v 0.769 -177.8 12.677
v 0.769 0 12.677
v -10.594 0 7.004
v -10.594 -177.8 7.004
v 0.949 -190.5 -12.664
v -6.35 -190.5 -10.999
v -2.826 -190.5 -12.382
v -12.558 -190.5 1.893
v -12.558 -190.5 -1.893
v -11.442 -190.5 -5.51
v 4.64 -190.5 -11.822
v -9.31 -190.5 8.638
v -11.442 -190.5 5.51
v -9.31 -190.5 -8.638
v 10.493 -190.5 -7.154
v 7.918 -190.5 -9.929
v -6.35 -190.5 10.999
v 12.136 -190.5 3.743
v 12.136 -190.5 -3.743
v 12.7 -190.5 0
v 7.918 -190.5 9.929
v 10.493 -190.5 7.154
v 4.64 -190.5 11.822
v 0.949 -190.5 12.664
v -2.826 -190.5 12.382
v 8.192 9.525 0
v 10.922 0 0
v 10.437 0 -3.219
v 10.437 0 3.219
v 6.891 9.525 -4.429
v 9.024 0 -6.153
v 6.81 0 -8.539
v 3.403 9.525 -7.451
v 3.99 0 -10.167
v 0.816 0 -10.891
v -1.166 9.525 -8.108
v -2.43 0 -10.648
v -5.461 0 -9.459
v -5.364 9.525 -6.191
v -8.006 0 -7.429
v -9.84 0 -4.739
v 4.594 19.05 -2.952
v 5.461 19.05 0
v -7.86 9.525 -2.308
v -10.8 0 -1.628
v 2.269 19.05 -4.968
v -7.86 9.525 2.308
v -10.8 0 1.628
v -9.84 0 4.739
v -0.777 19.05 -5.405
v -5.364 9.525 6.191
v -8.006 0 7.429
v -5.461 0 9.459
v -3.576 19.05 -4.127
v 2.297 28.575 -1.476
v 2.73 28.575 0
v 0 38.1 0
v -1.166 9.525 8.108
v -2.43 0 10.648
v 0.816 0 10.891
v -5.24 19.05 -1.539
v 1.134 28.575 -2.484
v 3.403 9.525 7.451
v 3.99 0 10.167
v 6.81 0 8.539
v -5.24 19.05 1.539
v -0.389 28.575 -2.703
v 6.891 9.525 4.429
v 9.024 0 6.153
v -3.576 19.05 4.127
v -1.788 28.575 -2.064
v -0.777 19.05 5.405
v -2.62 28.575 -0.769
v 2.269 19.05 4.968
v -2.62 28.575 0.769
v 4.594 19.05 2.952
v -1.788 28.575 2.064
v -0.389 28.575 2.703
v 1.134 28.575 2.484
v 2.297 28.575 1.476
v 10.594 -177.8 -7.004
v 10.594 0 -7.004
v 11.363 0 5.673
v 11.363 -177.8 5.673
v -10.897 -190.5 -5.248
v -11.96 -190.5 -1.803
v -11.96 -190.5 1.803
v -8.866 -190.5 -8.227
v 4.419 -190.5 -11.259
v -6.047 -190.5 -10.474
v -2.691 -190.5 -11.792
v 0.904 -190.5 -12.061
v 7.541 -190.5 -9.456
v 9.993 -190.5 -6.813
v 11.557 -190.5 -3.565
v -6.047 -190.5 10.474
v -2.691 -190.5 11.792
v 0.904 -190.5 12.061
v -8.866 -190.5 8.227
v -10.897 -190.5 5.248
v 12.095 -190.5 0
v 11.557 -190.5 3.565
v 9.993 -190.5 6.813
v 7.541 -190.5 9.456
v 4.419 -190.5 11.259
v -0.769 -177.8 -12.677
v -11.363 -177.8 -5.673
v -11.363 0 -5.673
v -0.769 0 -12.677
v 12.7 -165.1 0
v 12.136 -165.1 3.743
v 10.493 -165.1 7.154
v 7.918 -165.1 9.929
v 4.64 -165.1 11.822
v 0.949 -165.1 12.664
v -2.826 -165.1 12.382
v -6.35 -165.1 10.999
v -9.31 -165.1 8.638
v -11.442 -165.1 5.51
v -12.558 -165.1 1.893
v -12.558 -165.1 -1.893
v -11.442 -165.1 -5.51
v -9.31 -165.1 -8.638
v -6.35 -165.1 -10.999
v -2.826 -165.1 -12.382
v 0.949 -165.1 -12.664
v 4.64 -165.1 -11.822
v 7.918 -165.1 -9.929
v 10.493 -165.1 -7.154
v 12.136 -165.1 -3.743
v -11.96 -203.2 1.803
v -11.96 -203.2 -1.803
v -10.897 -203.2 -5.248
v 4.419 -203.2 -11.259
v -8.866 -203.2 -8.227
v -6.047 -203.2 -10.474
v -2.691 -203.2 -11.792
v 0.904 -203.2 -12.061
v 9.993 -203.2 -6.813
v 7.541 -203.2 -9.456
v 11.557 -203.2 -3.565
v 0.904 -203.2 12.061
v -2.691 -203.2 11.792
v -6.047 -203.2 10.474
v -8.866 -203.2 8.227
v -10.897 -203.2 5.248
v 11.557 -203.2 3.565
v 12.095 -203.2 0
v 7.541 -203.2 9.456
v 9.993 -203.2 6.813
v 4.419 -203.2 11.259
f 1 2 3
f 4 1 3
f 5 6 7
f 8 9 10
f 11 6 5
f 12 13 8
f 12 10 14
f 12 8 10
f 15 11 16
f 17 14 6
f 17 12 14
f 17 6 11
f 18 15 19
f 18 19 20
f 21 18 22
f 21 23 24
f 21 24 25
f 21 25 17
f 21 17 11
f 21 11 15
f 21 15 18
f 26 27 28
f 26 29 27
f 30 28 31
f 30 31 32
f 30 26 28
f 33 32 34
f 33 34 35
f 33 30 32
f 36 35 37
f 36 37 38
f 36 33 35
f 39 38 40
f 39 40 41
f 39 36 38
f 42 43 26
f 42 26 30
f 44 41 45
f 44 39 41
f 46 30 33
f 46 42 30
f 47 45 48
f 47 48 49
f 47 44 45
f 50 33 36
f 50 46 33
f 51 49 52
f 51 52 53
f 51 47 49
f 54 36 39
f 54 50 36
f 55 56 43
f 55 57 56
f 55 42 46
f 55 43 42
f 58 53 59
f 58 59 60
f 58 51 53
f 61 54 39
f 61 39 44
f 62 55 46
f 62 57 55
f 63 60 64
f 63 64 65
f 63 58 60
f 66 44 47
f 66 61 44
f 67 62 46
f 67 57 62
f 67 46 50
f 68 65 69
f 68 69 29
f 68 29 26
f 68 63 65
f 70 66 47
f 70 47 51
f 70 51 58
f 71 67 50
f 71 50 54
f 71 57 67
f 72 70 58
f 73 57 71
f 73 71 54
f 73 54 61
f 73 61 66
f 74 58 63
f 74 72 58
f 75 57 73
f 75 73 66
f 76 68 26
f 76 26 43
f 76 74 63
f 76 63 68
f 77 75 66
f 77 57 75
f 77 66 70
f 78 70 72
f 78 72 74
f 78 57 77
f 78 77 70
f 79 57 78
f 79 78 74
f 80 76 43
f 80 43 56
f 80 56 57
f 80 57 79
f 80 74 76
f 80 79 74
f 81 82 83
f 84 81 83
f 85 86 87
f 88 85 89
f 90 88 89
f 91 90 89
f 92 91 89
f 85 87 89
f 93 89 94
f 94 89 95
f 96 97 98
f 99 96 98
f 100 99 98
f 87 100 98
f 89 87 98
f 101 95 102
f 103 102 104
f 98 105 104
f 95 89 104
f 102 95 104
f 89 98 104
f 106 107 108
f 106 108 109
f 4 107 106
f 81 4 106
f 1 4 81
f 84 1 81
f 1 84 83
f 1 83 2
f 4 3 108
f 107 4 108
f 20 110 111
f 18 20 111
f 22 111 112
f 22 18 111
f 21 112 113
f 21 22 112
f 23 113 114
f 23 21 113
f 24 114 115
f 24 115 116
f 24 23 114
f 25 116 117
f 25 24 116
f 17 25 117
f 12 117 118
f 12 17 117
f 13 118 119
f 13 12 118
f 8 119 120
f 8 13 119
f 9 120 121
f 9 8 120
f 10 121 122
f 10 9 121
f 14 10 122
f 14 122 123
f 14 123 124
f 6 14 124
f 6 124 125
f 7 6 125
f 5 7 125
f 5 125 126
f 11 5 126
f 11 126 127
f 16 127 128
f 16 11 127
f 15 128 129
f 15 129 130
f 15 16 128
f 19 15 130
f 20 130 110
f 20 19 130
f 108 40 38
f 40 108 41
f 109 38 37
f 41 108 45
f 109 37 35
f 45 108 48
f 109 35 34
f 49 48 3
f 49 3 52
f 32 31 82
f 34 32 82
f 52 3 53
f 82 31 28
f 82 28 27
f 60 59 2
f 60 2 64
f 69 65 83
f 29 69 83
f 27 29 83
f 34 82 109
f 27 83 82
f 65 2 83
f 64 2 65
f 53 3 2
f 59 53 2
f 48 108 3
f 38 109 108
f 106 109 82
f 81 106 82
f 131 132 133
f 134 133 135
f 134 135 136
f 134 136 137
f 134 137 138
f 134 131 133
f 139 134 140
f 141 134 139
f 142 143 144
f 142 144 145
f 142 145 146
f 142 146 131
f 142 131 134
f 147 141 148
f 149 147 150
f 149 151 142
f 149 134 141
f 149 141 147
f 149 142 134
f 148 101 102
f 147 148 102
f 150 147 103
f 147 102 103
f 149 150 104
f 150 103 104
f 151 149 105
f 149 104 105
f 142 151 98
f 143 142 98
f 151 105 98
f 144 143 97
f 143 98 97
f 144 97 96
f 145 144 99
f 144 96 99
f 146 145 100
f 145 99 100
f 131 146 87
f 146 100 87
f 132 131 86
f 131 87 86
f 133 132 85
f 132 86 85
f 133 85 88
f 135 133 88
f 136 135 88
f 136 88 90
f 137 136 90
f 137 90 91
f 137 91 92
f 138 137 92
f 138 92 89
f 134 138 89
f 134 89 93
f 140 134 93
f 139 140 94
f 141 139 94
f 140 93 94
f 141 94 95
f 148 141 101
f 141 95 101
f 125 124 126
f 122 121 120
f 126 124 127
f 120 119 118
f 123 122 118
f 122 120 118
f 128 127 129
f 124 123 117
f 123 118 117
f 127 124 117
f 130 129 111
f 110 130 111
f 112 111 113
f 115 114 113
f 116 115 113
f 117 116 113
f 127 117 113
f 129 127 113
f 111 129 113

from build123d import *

# Parameters (mm, degrees)
F1_DEPTH = 177.8
F4_R     = 12.7
F5_DEPTH = 12.7
F6_R     = 12.09476
F7_DEPTH = 12.7


with BuildPart() as f1:
    # F0 (on Front) → F1 (new body)
    with BuildSketch(Plane.XZ):
        Polygon((-0.768505, -12.676727), (10.594115, -7.003908), (11.36262, 5.672819), (0.768505, 12.676727), (-10.594115, 7.003908), (-11.36262, -5.672819), align=None)
    extrude(amount=F1_DEPTH)

    # F2 (on Top) → F3 (revolve)
    with BuildSketch(Plane.XY):
        Polygon((0, 38.1), (0, 0), (10.922, 0), align=None)
    revolve(axis=Axis((0, 19.05, 0), (0, 1, 0)))


with BuildPart() as f5:
    # F4 (on face) → F5 (new body, symmetric)
    with BuildSketch(Plane.XZ.offset(177.8)):
        Circle(F4_R)
    extrude(amount=F5_DEPTH, both=True)


with BuildPart() as f7:
    # F6 (on face) → F7 (new body)
    with BuildSketch(Plane.XZ.offset(190.5)):
        Circle(F6_R)
    extrude(amount=F7_DEPTH)


solid = Compound([f1.part, f5.part, f7.part])
